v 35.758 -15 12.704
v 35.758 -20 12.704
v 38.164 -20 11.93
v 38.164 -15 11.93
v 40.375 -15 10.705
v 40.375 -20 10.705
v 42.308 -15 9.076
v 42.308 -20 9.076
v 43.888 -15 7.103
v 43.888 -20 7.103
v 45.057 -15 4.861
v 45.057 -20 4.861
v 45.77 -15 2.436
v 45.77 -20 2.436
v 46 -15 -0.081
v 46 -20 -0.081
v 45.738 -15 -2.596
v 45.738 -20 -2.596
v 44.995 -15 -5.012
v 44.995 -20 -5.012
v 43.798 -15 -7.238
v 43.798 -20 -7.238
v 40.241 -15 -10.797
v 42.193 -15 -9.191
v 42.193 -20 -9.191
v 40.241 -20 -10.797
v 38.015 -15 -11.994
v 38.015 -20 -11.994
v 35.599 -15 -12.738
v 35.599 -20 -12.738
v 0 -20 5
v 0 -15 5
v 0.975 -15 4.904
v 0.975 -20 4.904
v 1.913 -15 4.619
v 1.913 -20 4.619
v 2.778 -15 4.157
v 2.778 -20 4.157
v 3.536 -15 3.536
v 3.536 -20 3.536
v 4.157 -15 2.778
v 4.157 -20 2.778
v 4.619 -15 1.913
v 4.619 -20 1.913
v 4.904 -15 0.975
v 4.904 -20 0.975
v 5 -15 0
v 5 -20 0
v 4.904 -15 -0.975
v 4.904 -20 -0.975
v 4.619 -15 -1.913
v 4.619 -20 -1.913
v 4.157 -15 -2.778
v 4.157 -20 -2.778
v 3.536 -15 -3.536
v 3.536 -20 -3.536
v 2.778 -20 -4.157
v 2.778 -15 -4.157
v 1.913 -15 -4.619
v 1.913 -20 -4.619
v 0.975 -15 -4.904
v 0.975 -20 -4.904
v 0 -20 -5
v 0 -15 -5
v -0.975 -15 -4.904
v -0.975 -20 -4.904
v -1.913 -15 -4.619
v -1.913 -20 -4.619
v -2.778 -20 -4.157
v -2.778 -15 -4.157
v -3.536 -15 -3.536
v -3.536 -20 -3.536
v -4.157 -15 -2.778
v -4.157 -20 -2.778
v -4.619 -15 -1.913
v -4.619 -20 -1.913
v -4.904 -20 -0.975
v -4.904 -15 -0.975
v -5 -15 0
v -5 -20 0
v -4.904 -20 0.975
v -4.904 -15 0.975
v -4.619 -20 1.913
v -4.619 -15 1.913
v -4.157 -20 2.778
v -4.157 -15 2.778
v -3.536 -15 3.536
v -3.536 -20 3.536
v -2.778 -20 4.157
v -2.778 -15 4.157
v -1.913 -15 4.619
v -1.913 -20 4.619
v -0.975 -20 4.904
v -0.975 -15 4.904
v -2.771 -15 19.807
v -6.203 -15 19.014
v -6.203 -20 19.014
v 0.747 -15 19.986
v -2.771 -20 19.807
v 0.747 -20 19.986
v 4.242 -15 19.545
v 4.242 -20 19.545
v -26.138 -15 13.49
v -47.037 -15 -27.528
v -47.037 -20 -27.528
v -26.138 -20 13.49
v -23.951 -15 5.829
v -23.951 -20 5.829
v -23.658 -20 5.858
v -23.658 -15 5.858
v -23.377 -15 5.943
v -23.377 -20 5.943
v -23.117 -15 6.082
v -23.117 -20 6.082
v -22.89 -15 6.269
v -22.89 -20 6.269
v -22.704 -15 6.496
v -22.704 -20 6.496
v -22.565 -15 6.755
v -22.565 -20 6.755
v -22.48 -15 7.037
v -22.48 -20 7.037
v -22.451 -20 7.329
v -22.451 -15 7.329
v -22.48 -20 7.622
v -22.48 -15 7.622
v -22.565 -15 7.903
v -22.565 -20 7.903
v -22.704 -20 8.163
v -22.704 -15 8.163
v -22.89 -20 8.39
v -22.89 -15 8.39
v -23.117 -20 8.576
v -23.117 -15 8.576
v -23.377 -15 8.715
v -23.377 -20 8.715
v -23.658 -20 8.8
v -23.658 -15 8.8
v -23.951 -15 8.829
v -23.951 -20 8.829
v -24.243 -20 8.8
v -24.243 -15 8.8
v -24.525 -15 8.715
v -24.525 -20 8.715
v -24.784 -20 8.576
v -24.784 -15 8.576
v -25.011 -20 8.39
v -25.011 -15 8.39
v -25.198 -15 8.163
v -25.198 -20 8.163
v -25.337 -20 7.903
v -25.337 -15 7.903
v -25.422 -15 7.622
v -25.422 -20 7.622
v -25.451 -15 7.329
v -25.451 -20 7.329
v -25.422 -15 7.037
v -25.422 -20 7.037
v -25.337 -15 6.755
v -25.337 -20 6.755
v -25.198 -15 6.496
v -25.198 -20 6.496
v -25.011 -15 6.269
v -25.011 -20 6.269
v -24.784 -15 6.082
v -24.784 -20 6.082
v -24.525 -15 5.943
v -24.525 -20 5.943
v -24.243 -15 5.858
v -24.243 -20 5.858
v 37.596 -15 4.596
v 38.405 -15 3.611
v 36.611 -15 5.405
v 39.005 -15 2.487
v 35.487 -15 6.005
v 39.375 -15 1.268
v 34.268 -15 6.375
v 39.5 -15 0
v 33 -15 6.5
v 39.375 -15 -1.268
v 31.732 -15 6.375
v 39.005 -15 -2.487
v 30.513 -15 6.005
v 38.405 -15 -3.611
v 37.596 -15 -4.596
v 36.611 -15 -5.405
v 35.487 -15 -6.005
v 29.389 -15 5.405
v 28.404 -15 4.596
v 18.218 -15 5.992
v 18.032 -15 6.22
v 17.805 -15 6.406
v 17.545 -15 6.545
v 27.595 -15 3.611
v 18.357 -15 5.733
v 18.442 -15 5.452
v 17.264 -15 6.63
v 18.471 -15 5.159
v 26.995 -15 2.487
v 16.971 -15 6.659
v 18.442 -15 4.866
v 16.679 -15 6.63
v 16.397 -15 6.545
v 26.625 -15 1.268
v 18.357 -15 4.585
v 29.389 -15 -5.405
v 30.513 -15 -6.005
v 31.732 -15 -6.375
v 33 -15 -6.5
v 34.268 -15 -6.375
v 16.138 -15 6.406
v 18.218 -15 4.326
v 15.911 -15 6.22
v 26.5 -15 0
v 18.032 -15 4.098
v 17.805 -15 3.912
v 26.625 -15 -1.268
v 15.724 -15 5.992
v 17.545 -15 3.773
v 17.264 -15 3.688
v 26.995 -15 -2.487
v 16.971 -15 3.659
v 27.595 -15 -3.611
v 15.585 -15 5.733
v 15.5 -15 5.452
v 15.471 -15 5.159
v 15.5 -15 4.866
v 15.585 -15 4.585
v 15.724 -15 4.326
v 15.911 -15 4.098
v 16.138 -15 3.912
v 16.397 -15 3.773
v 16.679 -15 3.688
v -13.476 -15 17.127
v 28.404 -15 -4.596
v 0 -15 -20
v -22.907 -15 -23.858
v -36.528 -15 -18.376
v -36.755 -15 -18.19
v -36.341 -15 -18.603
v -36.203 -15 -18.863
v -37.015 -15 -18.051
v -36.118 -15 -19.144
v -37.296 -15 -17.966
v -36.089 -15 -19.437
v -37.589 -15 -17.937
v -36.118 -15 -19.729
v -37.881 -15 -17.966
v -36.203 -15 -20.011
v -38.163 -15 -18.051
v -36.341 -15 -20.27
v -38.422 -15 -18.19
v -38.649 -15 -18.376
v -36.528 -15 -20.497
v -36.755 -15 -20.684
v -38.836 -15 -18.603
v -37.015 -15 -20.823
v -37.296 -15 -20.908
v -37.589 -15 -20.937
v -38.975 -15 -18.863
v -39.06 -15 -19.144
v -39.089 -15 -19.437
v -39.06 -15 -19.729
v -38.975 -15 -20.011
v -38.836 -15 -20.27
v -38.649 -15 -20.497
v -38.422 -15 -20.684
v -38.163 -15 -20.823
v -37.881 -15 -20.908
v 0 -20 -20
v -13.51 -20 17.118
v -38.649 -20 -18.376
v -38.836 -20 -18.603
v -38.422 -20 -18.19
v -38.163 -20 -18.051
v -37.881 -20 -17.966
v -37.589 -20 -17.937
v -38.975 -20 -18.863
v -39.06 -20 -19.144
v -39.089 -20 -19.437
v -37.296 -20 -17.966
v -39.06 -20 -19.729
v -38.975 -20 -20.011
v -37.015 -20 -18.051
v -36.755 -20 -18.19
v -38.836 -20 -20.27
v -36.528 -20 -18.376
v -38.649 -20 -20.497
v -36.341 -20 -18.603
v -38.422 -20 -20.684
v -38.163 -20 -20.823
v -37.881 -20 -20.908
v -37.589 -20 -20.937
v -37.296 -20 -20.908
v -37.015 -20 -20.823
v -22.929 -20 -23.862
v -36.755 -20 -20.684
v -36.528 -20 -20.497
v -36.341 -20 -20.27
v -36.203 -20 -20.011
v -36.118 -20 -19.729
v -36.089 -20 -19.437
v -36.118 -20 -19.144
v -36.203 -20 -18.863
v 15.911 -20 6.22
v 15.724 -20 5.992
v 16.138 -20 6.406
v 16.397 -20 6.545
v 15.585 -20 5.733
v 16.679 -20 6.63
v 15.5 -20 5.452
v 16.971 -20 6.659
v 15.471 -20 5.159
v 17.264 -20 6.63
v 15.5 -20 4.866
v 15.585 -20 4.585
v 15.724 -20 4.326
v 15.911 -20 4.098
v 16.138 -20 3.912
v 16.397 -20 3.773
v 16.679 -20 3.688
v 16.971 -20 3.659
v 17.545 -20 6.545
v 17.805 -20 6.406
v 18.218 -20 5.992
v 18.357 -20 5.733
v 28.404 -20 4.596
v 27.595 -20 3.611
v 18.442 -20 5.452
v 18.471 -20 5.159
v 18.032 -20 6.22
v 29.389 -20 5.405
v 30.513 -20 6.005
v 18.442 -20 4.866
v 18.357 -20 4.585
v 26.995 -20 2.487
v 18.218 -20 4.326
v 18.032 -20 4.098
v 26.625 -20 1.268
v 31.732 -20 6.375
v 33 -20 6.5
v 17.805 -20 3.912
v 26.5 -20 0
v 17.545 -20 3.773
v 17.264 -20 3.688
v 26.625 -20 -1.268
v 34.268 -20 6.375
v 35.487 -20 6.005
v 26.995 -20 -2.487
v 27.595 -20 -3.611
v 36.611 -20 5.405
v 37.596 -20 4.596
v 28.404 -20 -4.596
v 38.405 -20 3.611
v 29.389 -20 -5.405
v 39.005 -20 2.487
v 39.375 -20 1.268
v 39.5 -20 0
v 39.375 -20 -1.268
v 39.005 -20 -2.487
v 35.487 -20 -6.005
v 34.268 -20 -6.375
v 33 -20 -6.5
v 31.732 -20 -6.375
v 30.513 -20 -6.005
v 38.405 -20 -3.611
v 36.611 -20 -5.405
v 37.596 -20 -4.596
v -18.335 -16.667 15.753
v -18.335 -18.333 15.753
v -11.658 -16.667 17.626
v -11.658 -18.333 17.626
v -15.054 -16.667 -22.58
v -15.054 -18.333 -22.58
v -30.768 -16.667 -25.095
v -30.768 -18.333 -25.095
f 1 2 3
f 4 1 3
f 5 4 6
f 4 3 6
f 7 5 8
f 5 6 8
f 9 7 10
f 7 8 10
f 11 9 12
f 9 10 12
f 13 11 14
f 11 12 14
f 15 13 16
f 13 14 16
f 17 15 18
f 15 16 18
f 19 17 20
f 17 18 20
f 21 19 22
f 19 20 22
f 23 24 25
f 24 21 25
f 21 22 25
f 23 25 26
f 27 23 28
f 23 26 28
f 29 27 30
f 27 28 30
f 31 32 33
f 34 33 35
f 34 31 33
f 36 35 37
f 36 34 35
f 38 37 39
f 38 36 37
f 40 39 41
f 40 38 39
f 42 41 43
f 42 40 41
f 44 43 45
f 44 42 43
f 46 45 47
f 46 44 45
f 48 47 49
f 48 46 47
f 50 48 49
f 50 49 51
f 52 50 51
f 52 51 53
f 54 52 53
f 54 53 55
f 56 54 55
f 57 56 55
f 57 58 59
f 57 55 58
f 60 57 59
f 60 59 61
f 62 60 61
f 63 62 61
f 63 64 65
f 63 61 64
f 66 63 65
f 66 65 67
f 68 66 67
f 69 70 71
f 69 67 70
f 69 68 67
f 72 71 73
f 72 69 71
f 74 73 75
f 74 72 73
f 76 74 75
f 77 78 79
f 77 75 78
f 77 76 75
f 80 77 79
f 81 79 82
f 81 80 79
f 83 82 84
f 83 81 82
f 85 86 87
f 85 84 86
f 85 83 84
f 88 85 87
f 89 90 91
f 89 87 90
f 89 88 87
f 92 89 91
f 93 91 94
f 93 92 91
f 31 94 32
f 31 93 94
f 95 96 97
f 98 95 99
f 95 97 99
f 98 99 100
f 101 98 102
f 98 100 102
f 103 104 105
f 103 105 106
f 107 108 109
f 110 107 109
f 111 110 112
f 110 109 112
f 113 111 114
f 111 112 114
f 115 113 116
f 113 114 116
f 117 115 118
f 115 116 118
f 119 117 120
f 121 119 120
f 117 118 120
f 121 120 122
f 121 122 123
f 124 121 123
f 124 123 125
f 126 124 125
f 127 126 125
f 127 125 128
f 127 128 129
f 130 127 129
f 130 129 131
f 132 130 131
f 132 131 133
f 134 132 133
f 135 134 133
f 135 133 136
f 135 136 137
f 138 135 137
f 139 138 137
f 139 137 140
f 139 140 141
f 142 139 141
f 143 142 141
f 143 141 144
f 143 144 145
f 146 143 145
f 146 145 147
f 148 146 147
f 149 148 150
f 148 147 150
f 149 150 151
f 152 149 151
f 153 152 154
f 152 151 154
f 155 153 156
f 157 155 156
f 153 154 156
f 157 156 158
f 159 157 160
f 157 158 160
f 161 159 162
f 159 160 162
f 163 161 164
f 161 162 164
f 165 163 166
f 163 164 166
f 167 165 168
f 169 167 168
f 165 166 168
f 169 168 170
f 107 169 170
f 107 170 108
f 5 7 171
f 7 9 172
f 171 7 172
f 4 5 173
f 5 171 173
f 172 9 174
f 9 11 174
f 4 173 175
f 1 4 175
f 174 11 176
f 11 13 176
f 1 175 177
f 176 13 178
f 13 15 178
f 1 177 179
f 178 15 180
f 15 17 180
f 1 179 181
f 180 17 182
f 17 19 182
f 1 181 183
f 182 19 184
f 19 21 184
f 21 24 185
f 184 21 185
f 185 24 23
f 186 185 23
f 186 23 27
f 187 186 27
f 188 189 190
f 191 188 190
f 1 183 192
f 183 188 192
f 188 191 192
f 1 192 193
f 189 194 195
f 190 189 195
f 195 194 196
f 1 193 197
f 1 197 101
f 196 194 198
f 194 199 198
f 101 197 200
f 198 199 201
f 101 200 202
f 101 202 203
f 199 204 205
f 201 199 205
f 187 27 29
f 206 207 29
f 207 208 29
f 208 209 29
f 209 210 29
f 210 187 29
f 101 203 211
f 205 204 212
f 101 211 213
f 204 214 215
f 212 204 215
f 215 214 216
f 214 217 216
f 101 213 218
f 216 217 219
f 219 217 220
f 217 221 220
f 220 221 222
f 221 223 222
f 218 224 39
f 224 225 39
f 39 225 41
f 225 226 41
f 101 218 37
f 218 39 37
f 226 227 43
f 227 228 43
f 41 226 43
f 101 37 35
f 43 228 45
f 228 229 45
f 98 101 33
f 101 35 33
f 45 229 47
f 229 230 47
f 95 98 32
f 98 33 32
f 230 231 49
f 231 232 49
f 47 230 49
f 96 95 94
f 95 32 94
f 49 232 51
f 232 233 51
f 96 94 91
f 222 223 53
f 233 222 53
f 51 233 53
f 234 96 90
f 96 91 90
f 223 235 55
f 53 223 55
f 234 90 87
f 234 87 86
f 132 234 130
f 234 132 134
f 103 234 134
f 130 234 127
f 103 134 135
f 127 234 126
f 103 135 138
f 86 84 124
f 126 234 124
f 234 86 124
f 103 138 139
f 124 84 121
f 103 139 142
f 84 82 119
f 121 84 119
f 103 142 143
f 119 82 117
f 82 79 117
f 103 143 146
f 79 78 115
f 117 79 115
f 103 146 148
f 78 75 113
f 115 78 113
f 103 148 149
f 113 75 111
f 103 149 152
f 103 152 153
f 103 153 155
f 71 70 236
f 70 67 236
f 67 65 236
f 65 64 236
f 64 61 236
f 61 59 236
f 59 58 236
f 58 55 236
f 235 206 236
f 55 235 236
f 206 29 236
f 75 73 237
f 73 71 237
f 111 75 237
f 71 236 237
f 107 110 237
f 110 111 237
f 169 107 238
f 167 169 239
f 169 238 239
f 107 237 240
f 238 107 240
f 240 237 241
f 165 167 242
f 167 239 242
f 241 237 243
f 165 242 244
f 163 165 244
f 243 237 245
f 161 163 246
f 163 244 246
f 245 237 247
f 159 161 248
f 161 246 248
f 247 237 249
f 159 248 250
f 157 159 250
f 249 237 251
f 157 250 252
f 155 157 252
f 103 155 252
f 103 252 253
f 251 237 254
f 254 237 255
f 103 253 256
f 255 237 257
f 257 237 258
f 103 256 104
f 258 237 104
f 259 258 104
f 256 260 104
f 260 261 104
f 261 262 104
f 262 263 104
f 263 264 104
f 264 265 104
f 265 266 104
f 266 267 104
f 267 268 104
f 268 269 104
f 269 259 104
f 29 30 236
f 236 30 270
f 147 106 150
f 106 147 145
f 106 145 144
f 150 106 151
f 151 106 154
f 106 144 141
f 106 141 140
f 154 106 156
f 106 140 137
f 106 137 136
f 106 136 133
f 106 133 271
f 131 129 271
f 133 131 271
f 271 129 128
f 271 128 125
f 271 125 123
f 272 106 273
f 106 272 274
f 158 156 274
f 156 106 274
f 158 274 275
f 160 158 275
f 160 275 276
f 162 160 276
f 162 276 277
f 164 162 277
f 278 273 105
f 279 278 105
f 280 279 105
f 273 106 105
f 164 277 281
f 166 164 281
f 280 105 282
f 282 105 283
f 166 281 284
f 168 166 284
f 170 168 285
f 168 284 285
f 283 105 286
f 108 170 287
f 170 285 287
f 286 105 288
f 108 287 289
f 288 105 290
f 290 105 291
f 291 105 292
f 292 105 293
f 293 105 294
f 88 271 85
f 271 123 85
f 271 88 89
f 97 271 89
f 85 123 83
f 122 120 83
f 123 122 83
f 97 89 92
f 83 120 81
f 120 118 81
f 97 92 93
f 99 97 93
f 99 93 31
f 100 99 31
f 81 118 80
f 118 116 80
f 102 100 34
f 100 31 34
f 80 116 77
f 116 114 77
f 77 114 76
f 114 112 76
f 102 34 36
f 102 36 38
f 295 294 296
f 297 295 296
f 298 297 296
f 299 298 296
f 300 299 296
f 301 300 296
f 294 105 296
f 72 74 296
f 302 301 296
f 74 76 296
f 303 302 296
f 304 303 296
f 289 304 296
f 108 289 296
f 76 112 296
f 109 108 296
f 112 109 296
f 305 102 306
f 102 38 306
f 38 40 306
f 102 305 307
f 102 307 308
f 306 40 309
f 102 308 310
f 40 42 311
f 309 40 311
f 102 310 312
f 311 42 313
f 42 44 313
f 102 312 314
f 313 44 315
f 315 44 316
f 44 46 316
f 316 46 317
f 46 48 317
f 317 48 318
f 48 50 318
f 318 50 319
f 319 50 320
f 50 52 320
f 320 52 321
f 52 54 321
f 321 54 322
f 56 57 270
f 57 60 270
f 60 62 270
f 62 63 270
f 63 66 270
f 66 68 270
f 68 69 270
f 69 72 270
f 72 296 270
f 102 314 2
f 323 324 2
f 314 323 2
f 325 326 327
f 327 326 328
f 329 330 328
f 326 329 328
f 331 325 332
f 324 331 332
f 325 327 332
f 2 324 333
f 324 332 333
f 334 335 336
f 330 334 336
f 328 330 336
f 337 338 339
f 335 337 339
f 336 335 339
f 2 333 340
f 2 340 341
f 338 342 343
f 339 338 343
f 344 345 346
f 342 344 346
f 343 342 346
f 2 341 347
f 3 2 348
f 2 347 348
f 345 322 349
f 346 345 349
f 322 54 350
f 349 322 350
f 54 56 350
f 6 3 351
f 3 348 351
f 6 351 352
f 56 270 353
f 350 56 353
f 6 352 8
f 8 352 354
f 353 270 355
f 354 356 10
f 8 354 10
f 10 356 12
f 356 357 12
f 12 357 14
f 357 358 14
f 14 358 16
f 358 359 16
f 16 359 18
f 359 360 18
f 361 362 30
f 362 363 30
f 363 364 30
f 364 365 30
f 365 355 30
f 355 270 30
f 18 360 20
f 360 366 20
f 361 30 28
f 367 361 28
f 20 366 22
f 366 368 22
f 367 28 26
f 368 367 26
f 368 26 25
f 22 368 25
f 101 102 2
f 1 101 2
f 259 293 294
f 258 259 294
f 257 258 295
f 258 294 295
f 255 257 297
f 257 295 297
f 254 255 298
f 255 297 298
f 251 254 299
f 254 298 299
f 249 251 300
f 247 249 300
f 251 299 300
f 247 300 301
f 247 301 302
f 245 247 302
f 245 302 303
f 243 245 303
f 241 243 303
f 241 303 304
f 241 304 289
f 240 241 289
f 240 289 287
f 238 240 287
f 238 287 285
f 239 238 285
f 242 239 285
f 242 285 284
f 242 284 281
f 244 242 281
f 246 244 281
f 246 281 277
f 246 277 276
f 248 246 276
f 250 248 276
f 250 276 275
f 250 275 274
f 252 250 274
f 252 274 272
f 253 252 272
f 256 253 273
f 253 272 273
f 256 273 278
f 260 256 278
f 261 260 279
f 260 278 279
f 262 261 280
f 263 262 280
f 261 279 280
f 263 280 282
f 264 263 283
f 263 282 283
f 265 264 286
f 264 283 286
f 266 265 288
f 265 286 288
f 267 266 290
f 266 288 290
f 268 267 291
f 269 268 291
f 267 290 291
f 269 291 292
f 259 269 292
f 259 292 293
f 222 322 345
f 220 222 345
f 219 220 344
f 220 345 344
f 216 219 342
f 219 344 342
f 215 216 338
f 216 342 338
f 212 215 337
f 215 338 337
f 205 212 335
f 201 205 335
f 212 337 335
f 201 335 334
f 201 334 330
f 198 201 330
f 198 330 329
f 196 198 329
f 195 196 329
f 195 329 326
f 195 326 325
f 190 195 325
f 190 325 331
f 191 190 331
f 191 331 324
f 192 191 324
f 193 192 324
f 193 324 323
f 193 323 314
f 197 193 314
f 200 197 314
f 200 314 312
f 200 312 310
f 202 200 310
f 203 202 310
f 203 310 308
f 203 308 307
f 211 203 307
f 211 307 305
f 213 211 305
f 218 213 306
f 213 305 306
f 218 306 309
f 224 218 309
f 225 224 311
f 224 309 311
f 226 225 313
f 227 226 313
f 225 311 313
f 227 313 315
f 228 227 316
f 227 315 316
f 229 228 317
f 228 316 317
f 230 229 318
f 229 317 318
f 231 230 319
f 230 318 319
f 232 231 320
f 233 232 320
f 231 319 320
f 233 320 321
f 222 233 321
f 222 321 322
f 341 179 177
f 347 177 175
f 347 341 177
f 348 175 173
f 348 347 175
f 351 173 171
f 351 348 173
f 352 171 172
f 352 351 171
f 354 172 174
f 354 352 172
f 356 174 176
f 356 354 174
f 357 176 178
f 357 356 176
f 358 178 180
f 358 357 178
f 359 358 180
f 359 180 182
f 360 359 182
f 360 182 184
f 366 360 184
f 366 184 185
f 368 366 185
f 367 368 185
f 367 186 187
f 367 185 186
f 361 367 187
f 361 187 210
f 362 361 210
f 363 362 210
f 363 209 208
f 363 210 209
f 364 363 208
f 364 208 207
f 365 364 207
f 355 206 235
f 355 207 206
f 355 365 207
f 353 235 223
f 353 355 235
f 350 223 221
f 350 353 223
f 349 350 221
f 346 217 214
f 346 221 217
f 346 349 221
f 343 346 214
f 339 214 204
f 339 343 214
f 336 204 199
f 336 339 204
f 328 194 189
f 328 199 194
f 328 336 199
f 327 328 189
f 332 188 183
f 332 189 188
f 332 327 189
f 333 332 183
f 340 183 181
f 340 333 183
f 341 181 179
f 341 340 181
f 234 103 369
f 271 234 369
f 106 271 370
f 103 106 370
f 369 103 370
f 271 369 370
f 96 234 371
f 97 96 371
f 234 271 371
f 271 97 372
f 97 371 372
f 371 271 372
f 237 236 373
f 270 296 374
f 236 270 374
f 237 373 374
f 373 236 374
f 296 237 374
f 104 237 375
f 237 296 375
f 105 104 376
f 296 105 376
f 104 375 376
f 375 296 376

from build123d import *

# Parameters (mm, degrees)
BOSS_EXTRUDE1_DEPTH      = 20
BOSS_EXTRUDE1_DEPTH_BACK = 20
SKETCH1_R                = 5
SKETCH1_R_2              = 6.5
CUT_EXTRUDE4_DEPTH       = 35
SKETCH6_R                = 1.5
CUT_EXTRUDE5_DEPTH       = 10
CUT_EXTRUDE6_DEPTH       = 50


with BuildPart() as part:
    # Sketch1 → Boss-Extrude1 (new, two sides: drawn at the far end of the back side and taken through both)
    with BuildSketch(Plane(origin=(0, 0, 0), x_dir=(1, 0, 0), z_dir=(0, 1, 0)).offset(-BOSS_EXTRUDE1_DEPTH_BACK)):
        with BuildLine():
            add(Edge.make_bspline(
                [(0, 20), (-114.873131821, 40.378289836), (-300, 56.568542495), (-328.284271247, 28.284271247)],
                knots=[0.1900067, 0.1900067, 0.1900067, 0.1900067, 1.1900067, 1.1900067, 1.1900067, 1.1900067], degree=3))
            ThreePointArc((-328.284271247, 28.284271247), (-328.284271247, -28.284271247), (-271.715728753, -28.284271247))
            add(Edge.make_bspline(
                [(-271.715728753, -28.284271247), (-194.91847241, 48.512985095), (-42.964488834, -10.495172733), (-6.202879594, -19.013791961)],
                knots=[0, 0, 0, 0, 0.930923327, 0.930923327, 0.930923327, 0.930923327], degree=3))
            ThreePointArc((-6.202879594, -19.013791961), (-1.015557257, -19.974199445), (4.242424242, -19.544867269))
            Line((4.242424242, -19.544867269), (35.757575758, -12.704163725))
            ThreePointArc((35.757575758, -12.704163725), (45.999746115, 0.081246157), (35.598568909, 12.737638699))
            Line((35.598568909, 12.737638699), (0, 20))
        make_face()
        with Locations(Location((0, 0, 0), (0, 0, 270))):
            Circle(SKETCH1_R, mode=Mode.SUBTRACT)
        with Locations(Location((33, 0, 0), (0, 0, 270))):
            Circle(SKETCH1_R_2, mode=Mode.SUBTRACT)
    extrude(amount=BOSS_EXTRUDE1_DEPTH + BOSS_EXTRUDE1_DEPTH_BACK)

    # Sketch5 → Cut-Extrude4 (cut)
    with BuildSketch(Plane(origin=(0, 20, 0), x_dir=(1, 0, 0), z_dir=(0, 1, 0))):
        Polygon((-47.037049996, 27.527548523), (92.120786702, 16.164640032), (85.724700256, -16.918764701), (-17.262768022, -30.907770073), align=None)
    extrude(amount=-CUT_EXTRUDE4_DEPTH, mode=Mode.SUBTRACT)

    # Sketch6 → Cut-Extrude5 (cut)
    with BuildSketch(Plane(origin=(0, -20, 0), x_dir=(-1, 0, 0), z_dir=(0, -1, 0))):
        with Locations(Location((23.950772589, -7.329216823, 0), (0, 0, 90))):
            Circle(SKETCH6_R)
        with Locations(Location((-16.971180087, -5.159042993, 0), (0, 0, 90))):
            Circle(SKETCH6_R)
        with Locations(Location((37.588692144, 19.43670737, 0), (0, 0, 90))):
            Circle(SKETCH6_R)
    extrude(amount=-CUT_EXTRUDE5_DEPTH, mode=Mode.SUBTRACT)

    # Sketch7 → Cut-Extrude6 (cut)
    with BuildSketch(Plane(origin=(0, 20, 0), x_dir=(1, 0, 0), z_dir=(0, 1, 0))):
        Polygon((-47.037049996, 27.527548523), (-26.137658318, -13.489817144), (-379.595719096, -92.580220424), (-321.505561991, 137.254748988), align=None)
    extrude(amount=-CUT_EXTRUDE6_DEPTH, mode=Mode.SUBTRACT)


solid = part.part
